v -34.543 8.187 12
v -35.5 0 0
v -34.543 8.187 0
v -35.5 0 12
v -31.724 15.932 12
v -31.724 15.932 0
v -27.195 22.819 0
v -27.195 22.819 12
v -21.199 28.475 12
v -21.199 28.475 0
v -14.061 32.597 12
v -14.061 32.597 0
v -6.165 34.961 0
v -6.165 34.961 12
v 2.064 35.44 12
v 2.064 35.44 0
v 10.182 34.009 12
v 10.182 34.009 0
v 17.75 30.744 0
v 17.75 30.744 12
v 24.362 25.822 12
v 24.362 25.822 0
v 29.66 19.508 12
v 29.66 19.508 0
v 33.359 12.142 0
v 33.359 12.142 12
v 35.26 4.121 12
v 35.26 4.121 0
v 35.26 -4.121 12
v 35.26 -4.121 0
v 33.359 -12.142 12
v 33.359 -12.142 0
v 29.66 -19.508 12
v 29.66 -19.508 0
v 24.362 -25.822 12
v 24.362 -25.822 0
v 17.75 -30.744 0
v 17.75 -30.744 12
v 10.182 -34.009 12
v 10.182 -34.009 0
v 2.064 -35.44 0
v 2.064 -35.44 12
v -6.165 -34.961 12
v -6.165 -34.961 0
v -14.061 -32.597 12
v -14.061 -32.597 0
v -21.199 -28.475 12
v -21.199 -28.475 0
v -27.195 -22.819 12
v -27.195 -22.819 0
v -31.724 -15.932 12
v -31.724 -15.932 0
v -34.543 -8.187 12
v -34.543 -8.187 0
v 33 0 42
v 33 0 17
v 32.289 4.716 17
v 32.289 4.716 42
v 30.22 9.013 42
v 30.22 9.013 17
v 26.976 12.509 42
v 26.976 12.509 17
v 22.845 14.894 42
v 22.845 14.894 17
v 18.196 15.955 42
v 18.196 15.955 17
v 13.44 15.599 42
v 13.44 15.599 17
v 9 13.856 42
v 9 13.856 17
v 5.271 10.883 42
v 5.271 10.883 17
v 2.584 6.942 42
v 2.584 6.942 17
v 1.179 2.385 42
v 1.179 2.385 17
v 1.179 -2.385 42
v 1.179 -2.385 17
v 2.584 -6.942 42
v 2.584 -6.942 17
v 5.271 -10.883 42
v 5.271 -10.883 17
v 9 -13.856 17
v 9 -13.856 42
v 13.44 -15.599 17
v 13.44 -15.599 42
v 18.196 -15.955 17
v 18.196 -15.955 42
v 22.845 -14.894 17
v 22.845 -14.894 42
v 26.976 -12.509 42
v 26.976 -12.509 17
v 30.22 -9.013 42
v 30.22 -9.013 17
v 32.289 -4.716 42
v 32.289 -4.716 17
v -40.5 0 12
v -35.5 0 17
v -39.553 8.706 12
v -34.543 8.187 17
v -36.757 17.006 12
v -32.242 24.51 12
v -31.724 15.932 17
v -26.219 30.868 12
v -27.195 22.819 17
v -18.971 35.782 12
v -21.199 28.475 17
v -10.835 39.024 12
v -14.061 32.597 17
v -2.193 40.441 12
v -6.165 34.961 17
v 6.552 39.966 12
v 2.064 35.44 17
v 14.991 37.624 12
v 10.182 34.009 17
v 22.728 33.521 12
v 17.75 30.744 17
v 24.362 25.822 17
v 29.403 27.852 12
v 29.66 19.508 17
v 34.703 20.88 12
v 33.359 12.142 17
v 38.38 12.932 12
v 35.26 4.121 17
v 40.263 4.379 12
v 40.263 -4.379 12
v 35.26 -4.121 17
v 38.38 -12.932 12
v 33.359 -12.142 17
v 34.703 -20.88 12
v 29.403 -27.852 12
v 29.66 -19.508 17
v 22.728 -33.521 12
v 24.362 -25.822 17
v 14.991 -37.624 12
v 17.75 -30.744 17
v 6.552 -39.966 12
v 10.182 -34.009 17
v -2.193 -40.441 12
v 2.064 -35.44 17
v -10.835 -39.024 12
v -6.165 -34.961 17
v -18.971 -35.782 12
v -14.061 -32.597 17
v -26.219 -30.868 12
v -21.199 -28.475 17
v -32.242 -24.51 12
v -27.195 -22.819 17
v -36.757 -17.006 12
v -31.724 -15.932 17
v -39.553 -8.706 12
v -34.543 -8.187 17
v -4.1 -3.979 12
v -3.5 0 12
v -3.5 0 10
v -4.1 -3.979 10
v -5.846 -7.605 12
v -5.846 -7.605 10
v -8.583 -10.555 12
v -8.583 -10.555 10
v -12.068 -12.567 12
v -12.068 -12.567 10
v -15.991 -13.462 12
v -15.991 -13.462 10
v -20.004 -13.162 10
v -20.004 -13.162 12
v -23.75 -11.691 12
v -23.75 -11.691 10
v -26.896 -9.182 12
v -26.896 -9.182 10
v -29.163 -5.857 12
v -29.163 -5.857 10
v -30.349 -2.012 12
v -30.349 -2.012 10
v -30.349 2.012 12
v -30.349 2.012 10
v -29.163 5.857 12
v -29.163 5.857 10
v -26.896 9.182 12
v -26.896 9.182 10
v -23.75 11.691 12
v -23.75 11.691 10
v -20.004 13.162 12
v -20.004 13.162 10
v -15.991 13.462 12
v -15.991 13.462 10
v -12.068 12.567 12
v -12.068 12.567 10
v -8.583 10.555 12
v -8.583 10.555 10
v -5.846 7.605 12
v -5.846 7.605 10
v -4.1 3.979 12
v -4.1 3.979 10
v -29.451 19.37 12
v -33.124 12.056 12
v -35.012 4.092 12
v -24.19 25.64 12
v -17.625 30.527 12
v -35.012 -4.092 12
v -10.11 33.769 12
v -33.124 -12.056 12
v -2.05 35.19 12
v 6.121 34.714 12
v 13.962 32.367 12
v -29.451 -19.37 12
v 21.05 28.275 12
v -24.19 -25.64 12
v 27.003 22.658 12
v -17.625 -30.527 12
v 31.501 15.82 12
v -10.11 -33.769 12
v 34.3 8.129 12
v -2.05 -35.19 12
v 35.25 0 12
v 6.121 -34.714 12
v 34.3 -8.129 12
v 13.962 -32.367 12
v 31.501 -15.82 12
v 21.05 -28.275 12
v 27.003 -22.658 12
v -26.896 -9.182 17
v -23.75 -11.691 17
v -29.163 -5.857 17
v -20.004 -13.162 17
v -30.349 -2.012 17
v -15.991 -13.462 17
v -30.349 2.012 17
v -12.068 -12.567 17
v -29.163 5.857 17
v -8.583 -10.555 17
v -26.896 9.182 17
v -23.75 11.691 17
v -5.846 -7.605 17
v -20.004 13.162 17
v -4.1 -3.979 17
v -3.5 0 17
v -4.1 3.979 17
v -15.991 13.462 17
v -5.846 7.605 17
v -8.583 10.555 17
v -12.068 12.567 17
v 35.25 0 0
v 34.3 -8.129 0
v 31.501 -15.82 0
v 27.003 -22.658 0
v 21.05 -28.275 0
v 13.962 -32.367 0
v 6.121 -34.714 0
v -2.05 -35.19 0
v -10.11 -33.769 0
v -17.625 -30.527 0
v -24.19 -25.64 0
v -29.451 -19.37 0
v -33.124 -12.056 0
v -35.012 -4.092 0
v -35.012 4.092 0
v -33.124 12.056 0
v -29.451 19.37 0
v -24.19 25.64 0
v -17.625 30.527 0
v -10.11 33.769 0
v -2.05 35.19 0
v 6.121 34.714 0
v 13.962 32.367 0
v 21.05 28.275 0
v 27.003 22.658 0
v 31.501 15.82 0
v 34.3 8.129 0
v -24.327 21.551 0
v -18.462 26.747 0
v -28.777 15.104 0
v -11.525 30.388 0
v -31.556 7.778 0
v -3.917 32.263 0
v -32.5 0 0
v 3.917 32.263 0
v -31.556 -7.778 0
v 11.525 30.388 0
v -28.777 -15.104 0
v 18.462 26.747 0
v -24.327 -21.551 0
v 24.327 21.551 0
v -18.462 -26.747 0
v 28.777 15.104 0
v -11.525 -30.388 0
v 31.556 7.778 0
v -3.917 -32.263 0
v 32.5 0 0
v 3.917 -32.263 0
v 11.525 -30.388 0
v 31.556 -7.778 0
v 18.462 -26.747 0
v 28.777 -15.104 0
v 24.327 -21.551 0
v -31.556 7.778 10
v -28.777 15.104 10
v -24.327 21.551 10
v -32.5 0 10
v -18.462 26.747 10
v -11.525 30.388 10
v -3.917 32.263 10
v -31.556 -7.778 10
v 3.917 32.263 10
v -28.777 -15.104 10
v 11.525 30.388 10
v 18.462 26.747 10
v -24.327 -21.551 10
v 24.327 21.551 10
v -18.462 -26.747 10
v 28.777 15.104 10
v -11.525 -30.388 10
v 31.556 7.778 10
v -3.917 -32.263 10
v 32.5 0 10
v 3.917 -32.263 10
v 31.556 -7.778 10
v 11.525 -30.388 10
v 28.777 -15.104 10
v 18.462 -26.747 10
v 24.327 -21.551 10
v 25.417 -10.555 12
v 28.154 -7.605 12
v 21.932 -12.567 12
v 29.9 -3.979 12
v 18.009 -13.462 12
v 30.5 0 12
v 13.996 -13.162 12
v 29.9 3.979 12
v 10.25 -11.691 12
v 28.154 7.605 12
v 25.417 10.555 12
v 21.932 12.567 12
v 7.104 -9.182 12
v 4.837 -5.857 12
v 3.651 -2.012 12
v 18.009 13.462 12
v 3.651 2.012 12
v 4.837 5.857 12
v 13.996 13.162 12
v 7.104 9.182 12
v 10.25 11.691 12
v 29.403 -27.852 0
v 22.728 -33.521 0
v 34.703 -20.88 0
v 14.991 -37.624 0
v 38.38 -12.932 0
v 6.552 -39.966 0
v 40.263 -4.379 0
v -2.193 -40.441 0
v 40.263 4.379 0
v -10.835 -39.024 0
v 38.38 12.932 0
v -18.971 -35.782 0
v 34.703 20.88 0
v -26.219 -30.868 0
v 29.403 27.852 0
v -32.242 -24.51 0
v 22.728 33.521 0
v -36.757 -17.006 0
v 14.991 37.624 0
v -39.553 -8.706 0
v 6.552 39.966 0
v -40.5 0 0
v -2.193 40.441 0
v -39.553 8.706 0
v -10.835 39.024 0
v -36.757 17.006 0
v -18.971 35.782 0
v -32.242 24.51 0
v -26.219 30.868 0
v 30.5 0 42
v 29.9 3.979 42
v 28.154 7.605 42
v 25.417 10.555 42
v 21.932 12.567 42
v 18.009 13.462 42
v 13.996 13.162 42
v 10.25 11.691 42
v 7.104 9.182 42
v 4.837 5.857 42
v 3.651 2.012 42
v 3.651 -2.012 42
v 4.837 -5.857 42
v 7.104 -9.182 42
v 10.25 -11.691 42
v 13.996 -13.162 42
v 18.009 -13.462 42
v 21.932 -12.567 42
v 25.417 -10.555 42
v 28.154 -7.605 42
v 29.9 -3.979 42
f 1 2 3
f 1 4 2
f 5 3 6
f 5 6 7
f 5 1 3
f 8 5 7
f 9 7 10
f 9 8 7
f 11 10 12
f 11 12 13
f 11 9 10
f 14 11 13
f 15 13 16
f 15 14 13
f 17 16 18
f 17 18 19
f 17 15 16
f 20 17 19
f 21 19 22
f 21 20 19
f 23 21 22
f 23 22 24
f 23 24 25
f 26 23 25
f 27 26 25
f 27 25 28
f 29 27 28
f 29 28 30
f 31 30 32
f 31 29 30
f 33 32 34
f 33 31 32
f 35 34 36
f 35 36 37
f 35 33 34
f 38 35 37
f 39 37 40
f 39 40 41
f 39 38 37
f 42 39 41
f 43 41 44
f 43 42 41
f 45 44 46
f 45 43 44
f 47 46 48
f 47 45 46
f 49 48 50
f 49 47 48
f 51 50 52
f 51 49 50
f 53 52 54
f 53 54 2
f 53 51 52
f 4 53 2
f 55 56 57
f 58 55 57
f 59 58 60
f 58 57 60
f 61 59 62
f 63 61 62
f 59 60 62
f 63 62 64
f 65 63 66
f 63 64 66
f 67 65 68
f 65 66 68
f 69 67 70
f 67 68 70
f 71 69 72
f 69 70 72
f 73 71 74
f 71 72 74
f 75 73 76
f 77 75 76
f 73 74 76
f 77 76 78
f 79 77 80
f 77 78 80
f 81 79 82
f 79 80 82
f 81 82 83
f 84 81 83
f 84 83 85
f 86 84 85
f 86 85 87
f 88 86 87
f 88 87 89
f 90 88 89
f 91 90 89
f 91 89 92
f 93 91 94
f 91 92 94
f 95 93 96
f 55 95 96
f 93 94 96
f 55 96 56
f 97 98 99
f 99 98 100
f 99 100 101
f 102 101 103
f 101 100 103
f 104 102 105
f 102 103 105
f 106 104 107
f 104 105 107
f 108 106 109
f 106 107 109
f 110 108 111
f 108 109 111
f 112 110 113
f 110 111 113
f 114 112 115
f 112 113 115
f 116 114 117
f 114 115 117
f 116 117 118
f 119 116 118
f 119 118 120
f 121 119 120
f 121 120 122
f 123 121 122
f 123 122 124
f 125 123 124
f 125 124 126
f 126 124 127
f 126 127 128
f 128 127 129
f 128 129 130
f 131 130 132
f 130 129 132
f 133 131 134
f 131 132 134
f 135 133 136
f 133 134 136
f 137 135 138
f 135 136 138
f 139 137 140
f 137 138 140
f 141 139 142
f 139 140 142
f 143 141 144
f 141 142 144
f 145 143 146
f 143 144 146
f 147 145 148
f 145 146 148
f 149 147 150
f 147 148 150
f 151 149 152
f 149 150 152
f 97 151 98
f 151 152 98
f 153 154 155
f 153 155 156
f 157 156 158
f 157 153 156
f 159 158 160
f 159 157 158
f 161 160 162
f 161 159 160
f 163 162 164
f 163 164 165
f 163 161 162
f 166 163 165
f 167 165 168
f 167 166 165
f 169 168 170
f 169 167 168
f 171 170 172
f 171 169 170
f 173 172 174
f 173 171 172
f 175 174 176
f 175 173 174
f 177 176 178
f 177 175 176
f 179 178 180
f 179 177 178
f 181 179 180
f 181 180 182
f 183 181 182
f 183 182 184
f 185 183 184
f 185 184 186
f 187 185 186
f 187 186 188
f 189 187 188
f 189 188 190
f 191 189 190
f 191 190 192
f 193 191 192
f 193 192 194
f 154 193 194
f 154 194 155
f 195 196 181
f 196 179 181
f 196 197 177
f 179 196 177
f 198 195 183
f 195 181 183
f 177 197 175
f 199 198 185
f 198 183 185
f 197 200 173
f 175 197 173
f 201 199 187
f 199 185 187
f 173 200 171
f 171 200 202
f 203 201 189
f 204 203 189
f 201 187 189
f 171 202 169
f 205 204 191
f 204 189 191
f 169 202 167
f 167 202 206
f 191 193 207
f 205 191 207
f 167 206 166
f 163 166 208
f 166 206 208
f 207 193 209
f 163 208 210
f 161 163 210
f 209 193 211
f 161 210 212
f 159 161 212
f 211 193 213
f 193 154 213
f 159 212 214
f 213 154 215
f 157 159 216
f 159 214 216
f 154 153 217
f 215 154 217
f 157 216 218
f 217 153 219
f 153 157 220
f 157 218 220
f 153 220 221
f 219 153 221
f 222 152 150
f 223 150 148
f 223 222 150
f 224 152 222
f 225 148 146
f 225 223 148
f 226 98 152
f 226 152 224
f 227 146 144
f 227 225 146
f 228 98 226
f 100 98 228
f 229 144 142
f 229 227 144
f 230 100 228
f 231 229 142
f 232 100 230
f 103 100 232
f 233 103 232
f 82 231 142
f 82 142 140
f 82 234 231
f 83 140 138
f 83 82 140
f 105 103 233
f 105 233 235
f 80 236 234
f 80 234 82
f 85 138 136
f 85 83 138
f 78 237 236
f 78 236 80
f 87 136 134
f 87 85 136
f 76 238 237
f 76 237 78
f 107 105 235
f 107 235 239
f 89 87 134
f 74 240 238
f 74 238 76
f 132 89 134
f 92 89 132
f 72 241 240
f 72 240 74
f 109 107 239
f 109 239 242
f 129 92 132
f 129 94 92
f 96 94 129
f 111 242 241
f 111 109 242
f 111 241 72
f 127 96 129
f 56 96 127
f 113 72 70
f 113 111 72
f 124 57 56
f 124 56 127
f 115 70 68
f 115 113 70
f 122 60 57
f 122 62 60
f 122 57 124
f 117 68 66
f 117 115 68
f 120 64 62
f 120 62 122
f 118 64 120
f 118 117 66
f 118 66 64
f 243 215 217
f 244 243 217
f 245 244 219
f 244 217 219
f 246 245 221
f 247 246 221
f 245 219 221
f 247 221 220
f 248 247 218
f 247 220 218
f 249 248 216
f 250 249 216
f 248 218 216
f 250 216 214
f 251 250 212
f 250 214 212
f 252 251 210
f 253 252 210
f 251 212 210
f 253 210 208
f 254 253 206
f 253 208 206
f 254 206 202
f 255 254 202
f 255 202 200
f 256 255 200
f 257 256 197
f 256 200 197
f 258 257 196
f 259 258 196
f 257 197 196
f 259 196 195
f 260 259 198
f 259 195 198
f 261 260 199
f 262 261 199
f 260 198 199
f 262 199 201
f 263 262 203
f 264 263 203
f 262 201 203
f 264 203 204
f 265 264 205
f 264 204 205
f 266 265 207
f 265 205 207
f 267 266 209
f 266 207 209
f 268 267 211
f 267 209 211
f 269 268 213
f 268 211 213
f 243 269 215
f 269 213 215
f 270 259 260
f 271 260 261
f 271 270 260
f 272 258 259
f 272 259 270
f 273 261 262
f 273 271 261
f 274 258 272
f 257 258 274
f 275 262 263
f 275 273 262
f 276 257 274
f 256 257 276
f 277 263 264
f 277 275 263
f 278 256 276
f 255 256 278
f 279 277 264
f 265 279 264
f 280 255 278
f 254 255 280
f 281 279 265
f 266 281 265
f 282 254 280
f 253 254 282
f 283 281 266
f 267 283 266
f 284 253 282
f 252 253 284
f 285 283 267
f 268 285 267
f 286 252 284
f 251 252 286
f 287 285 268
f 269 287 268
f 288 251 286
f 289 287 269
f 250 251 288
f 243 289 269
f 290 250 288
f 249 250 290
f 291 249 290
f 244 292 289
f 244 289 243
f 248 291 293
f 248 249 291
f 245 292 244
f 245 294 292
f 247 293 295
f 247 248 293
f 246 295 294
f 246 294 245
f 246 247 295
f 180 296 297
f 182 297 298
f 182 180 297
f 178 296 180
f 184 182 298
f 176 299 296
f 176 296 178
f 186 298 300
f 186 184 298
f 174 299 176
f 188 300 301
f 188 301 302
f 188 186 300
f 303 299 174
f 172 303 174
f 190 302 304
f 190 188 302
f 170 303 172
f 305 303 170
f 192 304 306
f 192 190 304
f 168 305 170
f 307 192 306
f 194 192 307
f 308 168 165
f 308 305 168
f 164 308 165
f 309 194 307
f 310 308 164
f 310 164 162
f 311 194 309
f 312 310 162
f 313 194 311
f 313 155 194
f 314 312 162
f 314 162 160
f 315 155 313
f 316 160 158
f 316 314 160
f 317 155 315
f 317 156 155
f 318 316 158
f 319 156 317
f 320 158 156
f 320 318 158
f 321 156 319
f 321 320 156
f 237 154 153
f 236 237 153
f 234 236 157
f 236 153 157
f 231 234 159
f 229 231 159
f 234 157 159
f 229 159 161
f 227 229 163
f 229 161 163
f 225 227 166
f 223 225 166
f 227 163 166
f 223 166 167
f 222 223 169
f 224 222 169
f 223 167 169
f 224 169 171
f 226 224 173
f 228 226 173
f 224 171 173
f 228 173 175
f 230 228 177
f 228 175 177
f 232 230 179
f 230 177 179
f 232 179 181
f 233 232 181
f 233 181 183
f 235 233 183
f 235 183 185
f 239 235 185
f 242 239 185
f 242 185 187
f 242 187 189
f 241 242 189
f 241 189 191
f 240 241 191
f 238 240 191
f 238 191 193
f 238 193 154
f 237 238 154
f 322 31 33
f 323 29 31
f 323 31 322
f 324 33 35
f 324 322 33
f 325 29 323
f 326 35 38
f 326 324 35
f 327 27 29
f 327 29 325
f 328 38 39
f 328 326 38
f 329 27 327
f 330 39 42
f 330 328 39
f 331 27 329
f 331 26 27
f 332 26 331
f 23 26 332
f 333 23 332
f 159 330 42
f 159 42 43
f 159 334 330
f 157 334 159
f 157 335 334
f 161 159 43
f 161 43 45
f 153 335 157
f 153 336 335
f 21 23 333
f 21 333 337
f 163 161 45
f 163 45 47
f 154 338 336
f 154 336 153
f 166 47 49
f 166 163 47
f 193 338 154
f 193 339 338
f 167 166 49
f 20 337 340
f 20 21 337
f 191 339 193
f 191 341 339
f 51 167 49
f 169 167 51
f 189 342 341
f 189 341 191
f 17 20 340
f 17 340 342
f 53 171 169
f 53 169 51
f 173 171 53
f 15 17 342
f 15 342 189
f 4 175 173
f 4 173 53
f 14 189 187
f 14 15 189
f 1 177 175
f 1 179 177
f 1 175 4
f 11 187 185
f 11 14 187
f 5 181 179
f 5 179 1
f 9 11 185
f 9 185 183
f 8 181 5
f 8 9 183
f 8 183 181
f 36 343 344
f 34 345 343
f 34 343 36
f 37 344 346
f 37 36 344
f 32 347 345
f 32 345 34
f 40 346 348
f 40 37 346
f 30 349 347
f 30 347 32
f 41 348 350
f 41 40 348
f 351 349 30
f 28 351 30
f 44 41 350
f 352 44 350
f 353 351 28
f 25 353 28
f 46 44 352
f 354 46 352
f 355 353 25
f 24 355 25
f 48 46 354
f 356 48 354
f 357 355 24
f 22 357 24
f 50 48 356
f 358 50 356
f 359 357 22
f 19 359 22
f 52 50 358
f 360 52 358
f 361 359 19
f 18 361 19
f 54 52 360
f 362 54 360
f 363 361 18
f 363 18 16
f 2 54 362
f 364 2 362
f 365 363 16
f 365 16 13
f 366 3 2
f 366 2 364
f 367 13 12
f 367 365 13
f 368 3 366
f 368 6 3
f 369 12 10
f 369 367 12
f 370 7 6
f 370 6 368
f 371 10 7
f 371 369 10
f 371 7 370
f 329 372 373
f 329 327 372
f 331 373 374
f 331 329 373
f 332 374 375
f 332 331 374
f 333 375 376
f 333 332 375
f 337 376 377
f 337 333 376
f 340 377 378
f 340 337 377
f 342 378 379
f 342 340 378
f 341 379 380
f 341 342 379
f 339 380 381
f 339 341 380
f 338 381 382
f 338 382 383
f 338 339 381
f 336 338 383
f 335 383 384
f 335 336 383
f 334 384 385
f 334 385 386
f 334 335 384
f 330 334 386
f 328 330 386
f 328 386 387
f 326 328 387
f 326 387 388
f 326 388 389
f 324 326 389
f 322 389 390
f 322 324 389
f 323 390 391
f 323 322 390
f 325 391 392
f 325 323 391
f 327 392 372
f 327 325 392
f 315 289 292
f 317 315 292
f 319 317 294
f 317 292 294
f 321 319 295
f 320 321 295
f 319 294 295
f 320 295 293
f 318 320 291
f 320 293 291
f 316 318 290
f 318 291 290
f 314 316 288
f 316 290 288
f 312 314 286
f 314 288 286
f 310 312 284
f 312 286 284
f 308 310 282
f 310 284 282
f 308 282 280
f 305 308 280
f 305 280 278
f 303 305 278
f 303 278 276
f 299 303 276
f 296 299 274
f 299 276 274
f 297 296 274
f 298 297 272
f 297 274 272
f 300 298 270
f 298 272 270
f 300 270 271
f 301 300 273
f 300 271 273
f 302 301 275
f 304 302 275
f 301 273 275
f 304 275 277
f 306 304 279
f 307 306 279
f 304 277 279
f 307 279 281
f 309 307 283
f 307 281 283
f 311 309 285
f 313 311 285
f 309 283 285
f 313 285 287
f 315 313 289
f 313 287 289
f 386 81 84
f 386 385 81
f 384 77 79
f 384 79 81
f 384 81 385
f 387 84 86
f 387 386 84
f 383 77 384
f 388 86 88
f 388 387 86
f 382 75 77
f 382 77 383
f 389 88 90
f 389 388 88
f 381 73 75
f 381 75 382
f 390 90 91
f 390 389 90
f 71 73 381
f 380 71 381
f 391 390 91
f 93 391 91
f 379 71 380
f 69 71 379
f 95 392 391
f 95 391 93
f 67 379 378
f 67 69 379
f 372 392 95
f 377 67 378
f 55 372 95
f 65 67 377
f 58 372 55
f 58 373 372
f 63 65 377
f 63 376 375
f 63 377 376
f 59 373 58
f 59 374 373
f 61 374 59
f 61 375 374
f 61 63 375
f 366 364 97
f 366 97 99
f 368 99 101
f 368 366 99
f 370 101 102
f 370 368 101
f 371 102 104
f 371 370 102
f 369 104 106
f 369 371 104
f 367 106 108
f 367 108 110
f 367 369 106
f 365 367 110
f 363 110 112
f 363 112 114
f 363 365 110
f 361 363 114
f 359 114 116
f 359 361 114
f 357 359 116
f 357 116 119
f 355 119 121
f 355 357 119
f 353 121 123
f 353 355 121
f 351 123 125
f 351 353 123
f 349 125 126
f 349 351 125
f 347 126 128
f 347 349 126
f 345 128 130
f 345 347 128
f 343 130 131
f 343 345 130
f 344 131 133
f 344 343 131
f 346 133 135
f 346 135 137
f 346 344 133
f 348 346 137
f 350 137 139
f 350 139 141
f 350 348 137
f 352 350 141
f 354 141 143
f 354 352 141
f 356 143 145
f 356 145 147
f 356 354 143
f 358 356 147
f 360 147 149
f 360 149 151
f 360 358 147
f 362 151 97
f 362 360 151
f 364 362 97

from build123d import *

# Parameters (mm, degrees)
F2_R      = 13.5
F3_DEPTH  = 25
F4_SIZE   = 5
F5_R      = 35.25
F5_R_2    = 13.5
F6_DEPTH  = 12
F7_R      = 32.5
F7_R_2    = 13.5
F8_DEPTH  = 10
F9_R      = 16
F9_R_2    = 13.5
F10_DEPTH = 25


with BuildPart() as f1:
    # F0 (on Front) → F1 (revolve)
    with BuildSketch(Plane.XZ):
        Polygon((-40.5, 17), (-40.5, 0), (-35.5, 0), (-35.5, 12), (0, 12), (0, 17), align=None)
    revolve(axis=Axis((0, 0, 14.5), (0, 0, -1)))

    # F2 (on face) → F3 (cut)
    with BuildSketch(Plane(origin=(0, 0, 12), x_dir=(1, 0, 0), z_dir=(0, 0, -1))):
        with Locations((-17, 0)):
            Circle(F2_R)
        with Locations((17, 0)):
            Circle(F2_R)
    extrude(amount=-F3_DEPTH, mode=Mode.SUBTRACT)

    # F4
    f4_edges = [f1.edges().sort_by_distance(p)[0] for p in [
        (40.5, 0, 17),
    ]]
    chamfer(f4_edges, length=F4_SIZE)

    # F9 (on face) → F10 (join)
    with BuildSketch(Plane.XY.offset(17)):
        with Locations((17, 0)):
            Circle(F9_R)
        with Locations((17, 0)):
            Circle(F9_R_2, mode=Mode.SUBTRACT)
    extrude(amount=F10_DEPTH)


with BuildPart() as f6:
    # F5 (on face) → F6 (new body)
    with BuildSketch(Plane(origin=(0, 0, 12), x_dir=(1, 0, 0), z_dir=(0, 0, -1))):
        Circle(F5_R)
        with Locations((-17, 0)):
            Circle(F5_R_2, mode=Mode.SUBTRACT)
        with Locations((17, 0)):
            Circle(F5_R_2, mode=Mode.SUBTRACT)
        Circle(F5_R)
        with Locations((-17, 0)):
            Circle(F5_R_2, mode=Mode.SUBTRACT)
    extrude(amount=F6_DEPTH)

    # F7 (on face) → F8 (cut)
    with BuildSketch(Plane(origin=(0, 0, 0), x_dir=(1, 0, 0), z_dir=(0, 0, -1))):
        Circle(F7_R)
        Circle(F7_R)
        with Locations((-17, 0)):
            Circle(F7_R_2, mode=Mode.SUBTRACT)
    extrude(amount=-F8_DEPTH, mode=Mode.SUBTRACT)


solid = Compound([f1.part, f6.part])
